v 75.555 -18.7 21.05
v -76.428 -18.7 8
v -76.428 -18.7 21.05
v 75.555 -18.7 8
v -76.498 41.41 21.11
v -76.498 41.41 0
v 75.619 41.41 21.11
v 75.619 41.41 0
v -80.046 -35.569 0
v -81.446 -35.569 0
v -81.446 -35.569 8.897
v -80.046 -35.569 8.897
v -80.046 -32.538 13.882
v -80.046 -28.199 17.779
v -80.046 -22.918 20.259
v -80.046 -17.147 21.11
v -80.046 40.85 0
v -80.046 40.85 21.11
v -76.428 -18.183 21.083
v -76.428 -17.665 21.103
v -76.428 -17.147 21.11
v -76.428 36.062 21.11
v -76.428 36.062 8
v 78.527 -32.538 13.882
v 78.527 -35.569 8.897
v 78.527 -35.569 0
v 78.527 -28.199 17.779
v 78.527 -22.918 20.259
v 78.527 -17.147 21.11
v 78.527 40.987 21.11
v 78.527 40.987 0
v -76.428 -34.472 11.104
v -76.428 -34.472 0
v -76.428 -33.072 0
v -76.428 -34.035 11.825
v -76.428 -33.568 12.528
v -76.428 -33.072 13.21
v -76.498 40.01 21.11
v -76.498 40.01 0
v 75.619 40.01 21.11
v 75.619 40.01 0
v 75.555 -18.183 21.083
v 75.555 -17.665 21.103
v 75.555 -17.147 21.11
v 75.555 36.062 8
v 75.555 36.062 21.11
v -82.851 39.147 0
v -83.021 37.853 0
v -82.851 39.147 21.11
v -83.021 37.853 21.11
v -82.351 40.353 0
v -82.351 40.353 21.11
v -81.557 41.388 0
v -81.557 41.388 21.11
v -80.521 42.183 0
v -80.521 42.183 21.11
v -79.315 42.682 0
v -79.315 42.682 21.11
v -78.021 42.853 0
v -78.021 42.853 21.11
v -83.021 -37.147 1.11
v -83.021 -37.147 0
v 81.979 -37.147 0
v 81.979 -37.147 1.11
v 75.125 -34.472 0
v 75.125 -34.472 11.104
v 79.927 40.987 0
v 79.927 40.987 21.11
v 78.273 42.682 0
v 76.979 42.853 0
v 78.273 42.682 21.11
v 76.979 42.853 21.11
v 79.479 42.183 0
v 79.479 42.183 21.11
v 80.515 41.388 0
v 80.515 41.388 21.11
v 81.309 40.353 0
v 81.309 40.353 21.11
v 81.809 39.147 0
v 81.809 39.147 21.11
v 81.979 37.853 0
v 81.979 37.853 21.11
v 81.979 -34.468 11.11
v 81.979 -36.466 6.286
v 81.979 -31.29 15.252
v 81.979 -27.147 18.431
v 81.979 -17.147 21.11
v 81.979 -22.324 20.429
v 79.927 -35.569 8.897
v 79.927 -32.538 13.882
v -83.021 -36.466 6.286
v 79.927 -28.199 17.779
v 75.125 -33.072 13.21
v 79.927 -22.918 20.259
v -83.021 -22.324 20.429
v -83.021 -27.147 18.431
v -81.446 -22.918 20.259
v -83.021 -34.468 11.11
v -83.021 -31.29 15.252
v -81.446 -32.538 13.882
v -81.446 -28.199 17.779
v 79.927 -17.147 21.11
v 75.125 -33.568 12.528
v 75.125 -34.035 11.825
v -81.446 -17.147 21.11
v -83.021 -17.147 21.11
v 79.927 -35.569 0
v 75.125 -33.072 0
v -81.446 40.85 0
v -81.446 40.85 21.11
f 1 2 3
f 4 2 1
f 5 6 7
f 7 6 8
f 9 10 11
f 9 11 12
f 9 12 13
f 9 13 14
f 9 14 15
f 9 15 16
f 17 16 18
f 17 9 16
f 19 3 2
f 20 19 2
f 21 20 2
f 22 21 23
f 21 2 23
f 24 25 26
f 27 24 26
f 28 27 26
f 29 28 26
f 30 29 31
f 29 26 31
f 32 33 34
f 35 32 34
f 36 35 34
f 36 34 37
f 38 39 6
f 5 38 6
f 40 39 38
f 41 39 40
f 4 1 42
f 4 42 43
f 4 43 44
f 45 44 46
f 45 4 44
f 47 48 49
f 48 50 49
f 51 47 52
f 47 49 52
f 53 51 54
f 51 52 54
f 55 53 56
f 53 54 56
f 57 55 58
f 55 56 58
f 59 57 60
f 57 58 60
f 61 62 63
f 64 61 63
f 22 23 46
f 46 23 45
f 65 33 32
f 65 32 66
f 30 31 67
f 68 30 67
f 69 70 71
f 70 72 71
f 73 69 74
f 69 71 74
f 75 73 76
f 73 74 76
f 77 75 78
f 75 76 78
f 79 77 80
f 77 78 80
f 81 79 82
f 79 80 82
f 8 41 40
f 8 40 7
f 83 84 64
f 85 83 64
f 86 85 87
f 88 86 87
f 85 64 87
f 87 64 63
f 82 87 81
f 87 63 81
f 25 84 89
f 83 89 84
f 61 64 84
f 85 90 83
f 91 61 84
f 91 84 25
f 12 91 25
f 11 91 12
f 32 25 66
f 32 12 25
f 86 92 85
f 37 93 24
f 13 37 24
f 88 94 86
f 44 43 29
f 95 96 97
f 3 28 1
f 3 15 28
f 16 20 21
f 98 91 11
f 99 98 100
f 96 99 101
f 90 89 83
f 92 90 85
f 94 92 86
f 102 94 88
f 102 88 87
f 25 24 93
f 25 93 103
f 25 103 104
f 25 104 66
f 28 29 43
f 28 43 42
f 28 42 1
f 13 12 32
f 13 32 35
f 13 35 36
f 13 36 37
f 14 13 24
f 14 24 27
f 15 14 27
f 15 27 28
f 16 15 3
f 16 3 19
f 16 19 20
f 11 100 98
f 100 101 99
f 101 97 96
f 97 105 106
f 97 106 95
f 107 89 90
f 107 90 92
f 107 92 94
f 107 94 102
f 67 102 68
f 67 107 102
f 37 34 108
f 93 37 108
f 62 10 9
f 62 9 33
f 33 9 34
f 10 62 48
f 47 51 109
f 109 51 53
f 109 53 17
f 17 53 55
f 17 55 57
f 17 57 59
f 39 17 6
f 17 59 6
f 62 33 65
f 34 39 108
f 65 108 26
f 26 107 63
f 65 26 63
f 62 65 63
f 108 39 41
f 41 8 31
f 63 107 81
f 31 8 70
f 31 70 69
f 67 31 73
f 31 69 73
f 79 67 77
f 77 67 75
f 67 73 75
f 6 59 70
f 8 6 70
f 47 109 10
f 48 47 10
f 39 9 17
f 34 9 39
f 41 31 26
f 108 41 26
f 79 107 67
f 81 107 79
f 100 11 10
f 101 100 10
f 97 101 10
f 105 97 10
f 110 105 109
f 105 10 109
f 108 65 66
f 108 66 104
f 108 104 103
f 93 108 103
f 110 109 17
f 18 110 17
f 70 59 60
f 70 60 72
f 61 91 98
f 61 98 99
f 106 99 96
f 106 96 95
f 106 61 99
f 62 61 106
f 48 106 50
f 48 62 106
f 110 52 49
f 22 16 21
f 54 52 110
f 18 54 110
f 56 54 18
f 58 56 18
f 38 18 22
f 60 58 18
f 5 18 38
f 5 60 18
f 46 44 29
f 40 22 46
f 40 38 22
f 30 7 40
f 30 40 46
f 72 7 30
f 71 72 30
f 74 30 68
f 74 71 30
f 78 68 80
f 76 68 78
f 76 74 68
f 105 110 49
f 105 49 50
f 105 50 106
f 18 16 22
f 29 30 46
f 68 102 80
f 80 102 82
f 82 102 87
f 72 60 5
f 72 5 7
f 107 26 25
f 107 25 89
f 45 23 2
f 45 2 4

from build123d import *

# Parameters (mm, degrees)
F0_W        = 165
F0_H        = 80
F0_W_2      = 151.5524461865
F0_H_2      = 1.4
F0_W_3      = 1.4
F0_H_3      = 76.4191485941
F0_H_4      = 76.5563435853
F0_W_4      = 151.9825384021
F0_H_5      = 54.7616053373
F0_W_5      = 152.1170958877
F1_DEPTH    = 21.11
F2_T1_DEPTH = 265
F3_DEPTH    = 8
F4_R        = 5


# Not quite as in the source:
# - a fillet or chamfer that OpenCascade refuses, or shapes differently, is made with other operations: its cross-section is extruded or revolved along the edge and cut away or added


with BuildPart() as f1:
    # F0 (on Top) → F1 (new body)
    with BuildSketch(Plane.XY):
        with Locations((-0.5210009217, 2.8526327014)):
            Rectangle(F0_W, F0_H)
        with Locations((-0.6515718997, -33.7715006649)):
            Rectangle(F0_W_2, F0_H_2, mode=Mode.SUBTRACT)
        with Locations((-80.7459980965, 2.6404876262)):
            Rectangle(F0_W_3, F0_H_3, mode=Mode.SUBTRACT)
        with Locations((79.2265801907, 2.7090851218)):
            Rectangle(F0_W_3, F0_H_4, mode=Mode.SUBTRACT)
        with Locations((-0.4365257919, 8.6810430512)):
            Rectangle(F0_W_4, F0_H_5, mode=Mode.SUBTRACT)
        with Locations((-0.4392154515, 40.7097370148)):
            Rectangle(F0_W_5, F0_H_2, mode=Mode.SUBTRACT)
    extrude(amount=F1_DEPTH)

    # F2: fillet of radius 20 on 1 edges, made by hand

    # F2_s2 → F2_t1 (cut)
    with BuildSketch(Plane.YZ.offset(-133.0210009217)):
        with BuildLine():
            ThreePointArc((-37.1473672986, 1.11), (-31.2895029223, 15.2521356237), (-17.1473672986, 21.11))
            Line((-17.1473672986, 21.11), (-37.1473672986, 21.11))
            Line((-37.1473672986, 21.11), (-37.1473672986, 1.11))
        make_face()
    extrude(amount=F2_T1_DEPTH, mode=Mode.SUBTRACT)

    # F0 (on Top) → F3 (join)
    with BuildSketch(Plane.XY):
        with Locations((-0.4365257919, 8.6810430512)):
            Rectangle(F0_W_4, F0_H_5)
    extrude(amount=F3_DEPTH)

    # F4
    f4_edges = [f1.edges().sort_by_distance(p)[0] for p in [
        (-83.021001, 42.852633, 10.555),
        (81.978999, 42.852633, 10.555),
    ]]
    fillet(f4_edges, radius=F4_R)


solid = f1.part
